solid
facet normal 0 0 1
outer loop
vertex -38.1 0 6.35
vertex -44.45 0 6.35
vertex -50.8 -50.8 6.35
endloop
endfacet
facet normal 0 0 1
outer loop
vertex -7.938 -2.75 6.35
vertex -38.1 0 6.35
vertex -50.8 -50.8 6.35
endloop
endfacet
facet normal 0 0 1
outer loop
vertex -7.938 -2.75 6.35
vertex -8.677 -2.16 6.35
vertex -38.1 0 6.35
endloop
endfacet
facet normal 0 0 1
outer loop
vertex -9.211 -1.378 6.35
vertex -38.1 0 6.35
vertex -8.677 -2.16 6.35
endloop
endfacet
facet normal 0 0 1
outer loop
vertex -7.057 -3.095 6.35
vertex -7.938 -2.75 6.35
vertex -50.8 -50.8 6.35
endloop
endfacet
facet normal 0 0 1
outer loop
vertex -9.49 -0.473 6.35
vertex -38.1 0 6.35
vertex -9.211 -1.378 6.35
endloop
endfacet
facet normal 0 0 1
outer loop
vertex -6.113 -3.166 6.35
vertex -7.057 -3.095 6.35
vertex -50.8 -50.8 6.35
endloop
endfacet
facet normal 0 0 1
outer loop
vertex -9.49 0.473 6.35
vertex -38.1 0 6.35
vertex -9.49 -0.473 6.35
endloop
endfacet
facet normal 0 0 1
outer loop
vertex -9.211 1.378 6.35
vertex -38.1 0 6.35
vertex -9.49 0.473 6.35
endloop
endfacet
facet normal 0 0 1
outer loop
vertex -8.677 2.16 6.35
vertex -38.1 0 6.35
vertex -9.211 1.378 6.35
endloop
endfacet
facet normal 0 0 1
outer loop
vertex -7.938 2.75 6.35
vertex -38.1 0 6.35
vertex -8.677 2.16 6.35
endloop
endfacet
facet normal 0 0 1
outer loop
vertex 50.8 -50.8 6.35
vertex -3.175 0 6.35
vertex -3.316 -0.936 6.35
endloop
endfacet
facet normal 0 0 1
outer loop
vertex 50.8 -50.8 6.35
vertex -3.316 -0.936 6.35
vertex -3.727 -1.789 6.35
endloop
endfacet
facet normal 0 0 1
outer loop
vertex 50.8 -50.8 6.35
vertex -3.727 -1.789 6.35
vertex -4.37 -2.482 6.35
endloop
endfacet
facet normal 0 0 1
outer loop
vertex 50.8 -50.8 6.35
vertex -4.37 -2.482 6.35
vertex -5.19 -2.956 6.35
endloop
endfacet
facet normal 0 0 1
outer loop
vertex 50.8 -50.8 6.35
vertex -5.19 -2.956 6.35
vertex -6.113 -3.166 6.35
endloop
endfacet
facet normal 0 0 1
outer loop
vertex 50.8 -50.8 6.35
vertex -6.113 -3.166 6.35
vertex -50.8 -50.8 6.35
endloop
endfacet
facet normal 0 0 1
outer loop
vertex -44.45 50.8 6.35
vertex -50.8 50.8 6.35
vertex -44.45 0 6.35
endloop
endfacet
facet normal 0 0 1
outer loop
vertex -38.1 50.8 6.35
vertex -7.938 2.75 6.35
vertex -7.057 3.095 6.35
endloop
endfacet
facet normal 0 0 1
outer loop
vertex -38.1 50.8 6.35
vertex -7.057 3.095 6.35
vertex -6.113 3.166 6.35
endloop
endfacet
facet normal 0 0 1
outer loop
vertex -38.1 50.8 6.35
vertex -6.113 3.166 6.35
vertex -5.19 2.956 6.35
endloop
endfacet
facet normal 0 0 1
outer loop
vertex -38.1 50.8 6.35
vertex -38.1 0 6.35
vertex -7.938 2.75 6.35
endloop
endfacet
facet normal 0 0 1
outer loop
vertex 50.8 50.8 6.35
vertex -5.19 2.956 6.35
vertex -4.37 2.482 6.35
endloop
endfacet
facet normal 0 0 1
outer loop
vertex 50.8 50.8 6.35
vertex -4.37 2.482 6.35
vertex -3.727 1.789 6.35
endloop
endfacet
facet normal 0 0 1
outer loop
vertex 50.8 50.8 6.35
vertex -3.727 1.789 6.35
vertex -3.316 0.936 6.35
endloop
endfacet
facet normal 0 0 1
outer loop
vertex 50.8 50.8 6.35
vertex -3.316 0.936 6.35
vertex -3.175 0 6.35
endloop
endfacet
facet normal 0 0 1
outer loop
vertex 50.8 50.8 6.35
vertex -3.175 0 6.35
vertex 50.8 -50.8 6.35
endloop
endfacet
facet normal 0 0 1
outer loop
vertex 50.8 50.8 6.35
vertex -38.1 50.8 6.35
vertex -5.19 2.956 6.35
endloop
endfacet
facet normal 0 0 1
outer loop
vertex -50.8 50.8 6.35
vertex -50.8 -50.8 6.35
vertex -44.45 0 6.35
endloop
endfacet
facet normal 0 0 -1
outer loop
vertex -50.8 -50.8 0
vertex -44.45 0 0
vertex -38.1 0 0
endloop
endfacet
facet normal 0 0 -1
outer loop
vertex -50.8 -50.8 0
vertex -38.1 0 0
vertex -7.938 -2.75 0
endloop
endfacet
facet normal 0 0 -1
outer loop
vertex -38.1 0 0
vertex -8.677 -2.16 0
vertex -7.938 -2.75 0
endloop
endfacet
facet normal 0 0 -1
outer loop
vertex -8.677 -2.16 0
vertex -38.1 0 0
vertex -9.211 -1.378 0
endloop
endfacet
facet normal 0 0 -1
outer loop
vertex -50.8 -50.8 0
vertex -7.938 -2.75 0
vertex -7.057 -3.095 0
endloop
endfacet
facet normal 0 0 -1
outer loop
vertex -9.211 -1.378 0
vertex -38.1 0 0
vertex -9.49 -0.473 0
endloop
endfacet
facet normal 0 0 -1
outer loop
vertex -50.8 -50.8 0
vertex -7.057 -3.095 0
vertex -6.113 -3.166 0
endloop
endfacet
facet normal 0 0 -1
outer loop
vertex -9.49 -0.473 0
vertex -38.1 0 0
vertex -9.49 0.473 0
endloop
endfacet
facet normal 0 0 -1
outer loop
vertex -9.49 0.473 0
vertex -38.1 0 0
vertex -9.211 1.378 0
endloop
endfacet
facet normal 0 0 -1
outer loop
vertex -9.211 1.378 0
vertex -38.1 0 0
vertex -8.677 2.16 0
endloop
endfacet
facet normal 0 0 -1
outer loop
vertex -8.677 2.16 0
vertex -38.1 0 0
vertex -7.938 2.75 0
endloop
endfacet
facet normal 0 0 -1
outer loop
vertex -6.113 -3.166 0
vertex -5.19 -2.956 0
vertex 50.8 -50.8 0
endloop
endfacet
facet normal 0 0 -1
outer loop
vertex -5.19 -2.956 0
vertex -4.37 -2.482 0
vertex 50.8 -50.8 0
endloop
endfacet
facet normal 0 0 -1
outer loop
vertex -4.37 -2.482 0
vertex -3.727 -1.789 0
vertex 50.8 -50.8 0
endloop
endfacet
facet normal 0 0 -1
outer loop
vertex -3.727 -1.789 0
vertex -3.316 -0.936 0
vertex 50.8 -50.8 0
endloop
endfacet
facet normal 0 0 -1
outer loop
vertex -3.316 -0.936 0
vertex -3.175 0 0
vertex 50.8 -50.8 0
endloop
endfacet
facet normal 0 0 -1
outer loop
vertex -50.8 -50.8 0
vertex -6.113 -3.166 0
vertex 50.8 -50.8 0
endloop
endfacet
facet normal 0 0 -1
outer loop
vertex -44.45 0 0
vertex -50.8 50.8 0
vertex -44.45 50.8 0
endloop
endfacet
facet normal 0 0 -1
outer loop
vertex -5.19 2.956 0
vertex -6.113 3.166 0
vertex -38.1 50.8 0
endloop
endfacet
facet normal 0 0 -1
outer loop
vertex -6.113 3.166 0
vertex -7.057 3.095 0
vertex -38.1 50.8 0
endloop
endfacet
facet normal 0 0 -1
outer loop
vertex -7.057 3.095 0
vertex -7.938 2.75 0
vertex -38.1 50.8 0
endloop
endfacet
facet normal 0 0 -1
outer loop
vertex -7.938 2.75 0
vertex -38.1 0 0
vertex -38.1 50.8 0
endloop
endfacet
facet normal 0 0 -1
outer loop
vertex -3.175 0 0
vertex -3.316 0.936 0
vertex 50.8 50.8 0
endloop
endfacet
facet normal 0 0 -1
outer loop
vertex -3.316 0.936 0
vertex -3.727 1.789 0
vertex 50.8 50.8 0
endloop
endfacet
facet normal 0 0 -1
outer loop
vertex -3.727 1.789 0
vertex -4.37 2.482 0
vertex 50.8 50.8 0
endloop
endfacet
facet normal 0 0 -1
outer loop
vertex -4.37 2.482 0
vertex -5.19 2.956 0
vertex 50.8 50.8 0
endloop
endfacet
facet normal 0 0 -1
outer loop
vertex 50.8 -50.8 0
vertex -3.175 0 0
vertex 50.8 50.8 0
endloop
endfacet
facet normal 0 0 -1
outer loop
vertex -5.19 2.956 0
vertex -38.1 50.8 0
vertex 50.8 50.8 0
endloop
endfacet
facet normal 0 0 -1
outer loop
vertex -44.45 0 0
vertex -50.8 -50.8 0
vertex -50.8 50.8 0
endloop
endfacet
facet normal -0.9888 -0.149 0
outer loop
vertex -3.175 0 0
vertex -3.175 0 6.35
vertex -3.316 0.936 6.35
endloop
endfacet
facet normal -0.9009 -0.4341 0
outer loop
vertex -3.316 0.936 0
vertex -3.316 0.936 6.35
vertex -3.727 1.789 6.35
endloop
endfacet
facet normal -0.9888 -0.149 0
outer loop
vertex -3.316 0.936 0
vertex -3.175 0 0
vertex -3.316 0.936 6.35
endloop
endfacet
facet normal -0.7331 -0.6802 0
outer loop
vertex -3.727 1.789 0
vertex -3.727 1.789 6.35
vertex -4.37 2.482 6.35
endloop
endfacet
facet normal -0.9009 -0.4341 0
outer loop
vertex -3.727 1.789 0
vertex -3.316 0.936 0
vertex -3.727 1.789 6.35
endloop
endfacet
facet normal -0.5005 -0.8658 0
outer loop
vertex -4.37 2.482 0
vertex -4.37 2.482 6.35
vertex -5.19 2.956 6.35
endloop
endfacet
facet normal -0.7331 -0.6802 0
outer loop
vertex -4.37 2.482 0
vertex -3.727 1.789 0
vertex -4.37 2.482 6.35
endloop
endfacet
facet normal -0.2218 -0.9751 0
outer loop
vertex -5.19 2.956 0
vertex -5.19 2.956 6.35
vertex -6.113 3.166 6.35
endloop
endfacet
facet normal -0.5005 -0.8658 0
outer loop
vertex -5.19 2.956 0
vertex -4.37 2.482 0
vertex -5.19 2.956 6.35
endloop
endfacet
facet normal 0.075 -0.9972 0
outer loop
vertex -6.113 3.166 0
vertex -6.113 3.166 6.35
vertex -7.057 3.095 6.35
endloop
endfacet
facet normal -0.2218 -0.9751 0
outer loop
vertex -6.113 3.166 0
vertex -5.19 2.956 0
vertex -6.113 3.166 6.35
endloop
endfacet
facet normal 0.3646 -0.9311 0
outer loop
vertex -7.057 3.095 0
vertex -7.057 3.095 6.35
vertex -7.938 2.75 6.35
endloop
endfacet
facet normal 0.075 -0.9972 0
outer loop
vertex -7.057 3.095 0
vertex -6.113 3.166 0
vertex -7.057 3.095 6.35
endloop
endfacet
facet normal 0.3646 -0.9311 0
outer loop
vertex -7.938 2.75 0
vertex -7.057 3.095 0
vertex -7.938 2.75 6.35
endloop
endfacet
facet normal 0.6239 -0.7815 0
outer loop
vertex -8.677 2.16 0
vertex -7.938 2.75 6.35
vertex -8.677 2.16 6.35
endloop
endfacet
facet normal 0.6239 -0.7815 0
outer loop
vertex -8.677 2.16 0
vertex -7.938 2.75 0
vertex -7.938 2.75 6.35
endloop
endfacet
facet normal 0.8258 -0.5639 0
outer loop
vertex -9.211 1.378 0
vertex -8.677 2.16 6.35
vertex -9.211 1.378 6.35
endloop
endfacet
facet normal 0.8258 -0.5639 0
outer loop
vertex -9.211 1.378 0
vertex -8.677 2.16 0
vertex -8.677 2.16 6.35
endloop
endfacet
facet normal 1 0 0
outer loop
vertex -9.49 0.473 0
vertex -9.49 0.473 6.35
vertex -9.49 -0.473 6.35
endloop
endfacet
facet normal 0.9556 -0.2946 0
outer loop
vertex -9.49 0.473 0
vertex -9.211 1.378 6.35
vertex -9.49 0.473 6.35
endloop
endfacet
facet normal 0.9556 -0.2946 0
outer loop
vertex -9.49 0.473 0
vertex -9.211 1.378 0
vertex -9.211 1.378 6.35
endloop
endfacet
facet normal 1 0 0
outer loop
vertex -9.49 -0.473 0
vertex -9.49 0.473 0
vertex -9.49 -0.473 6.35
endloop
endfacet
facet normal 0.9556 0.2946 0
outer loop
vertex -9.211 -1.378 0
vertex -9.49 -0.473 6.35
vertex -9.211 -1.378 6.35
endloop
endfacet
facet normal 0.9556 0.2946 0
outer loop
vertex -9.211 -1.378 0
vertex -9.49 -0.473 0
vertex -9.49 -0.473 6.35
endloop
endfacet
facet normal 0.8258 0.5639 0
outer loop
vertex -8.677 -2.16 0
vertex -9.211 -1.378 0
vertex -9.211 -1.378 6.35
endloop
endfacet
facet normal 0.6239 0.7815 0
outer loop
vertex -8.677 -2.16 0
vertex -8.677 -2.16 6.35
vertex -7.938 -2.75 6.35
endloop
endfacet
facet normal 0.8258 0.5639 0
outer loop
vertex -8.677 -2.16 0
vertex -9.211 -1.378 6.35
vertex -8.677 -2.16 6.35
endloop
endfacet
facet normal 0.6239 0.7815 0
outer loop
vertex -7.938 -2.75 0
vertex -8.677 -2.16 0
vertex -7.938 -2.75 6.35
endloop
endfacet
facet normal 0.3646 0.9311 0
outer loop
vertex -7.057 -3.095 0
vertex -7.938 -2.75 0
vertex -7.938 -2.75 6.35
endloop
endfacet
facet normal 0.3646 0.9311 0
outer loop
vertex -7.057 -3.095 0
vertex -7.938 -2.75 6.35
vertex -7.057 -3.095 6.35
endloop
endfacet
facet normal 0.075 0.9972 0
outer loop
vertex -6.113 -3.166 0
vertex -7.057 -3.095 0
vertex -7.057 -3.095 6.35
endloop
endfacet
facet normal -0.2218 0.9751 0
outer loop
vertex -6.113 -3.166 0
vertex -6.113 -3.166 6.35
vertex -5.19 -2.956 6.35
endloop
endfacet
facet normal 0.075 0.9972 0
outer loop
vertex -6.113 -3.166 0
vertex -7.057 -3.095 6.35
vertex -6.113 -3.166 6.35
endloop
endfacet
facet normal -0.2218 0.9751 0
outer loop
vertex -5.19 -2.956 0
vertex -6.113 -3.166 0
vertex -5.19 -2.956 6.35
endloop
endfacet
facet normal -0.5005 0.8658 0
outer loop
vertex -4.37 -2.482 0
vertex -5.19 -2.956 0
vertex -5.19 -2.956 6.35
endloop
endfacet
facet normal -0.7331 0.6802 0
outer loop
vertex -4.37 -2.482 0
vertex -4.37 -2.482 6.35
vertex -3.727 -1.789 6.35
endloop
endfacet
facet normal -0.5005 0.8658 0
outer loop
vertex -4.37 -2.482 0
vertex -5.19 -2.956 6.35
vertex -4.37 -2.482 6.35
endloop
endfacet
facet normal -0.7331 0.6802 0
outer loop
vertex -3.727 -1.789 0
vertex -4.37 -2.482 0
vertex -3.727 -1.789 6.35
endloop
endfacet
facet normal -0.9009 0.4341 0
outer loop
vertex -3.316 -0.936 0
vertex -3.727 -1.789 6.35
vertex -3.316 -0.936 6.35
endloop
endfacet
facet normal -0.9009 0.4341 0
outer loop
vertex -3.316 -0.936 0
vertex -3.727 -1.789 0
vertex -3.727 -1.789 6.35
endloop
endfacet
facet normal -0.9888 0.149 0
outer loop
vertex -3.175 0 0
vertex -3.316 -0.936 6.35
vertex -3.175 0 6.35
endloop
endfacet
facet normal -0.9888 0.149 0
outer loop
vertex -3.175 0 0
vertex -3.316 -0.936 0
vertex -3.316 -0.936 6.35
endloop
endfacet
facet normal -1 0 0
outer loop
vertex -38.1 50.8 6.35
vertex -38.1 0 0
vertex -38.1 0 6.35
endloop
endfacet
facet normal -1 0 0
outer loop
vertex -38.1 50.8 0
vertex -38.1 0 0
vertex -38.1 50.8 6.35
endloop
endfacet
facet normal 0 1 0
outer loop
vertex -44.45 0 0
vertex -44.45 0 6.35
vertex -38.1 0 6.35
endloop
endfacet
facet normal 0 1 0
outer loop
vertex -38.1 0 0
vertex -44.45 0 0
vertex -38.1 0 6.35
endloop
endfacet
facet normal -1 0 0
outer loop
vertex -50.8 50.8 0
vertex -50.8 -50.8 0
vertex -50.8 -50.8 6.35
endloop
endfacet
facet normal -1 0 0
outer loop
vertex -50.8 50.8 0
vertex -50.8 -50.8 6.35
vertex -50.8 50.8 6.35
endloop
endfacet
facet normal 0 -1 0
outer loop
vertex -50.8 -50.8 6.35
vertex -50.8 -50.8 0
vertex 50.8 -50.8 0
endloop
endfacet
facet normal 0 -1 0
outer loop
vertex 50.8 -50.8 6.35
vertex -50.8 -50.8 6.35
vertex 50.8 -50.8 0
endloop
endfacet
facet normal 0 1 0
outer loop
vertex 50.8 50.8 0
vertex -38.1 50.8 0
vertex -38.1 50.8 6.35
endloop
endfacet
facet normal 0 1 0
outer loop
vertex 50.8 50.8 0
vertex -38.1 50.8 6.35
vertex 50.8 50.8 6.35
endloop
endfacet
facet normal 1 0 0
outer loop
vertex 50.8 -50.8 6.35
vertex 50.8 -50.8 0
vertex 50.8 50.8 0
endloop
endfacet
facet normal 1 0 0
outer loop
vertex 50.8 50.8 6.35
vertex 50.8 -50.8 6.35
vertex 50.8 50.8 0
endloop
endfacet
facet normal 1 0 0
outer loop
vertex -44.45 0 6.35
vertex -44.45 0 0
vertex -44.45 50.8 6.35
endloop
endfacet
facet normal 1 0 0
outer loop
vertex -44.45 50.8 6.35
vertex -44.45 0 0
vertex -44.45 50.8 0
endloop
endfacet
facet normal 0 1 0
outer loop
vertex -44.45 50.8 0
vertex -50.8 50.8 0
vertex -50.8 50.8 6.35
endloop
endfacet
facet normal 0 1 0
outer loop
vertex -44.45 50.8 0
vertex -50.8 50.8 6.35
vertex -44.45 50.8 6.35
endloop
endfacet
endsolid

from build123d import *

# Parameters (mm, degrees)
F0_W     = 101.6
F0_H     = 101.6
F1_DEPTH = 6.35
F2_R     = 3.175
F3_DEPTH = 6.351
F4_W     = 6.35
F4_H     = 50.8
F5_DEPTH = 6.351


with BuildPart() as f1:
    # F0 (on Top) → F1 (new body)
    with BuildSketch(Plane.XY):
        Rectangle(F0_W, F0_H)
    extrude(amount=F1_DEPTH)

    # F2 (on Top) → F3 (cut, through all)
    with BuildSketch(Plane.XY):
        with Locations((-6.35, 0)):
            Circle(F2_R)
    extrude(amount=F3_DEPTH, mode=Mode.SUBTRACT)

    # F4 (on Top) → F5 (cut, through all)
    with BuildSketch(Plane.XY):
        with Locations((-41.275, 25.4)):
            Rectangle(F4_W, F4_H)
    extrude(amount=F5_DEPTH, mode=Mode.SUBTRACT)


solid = f1.part
